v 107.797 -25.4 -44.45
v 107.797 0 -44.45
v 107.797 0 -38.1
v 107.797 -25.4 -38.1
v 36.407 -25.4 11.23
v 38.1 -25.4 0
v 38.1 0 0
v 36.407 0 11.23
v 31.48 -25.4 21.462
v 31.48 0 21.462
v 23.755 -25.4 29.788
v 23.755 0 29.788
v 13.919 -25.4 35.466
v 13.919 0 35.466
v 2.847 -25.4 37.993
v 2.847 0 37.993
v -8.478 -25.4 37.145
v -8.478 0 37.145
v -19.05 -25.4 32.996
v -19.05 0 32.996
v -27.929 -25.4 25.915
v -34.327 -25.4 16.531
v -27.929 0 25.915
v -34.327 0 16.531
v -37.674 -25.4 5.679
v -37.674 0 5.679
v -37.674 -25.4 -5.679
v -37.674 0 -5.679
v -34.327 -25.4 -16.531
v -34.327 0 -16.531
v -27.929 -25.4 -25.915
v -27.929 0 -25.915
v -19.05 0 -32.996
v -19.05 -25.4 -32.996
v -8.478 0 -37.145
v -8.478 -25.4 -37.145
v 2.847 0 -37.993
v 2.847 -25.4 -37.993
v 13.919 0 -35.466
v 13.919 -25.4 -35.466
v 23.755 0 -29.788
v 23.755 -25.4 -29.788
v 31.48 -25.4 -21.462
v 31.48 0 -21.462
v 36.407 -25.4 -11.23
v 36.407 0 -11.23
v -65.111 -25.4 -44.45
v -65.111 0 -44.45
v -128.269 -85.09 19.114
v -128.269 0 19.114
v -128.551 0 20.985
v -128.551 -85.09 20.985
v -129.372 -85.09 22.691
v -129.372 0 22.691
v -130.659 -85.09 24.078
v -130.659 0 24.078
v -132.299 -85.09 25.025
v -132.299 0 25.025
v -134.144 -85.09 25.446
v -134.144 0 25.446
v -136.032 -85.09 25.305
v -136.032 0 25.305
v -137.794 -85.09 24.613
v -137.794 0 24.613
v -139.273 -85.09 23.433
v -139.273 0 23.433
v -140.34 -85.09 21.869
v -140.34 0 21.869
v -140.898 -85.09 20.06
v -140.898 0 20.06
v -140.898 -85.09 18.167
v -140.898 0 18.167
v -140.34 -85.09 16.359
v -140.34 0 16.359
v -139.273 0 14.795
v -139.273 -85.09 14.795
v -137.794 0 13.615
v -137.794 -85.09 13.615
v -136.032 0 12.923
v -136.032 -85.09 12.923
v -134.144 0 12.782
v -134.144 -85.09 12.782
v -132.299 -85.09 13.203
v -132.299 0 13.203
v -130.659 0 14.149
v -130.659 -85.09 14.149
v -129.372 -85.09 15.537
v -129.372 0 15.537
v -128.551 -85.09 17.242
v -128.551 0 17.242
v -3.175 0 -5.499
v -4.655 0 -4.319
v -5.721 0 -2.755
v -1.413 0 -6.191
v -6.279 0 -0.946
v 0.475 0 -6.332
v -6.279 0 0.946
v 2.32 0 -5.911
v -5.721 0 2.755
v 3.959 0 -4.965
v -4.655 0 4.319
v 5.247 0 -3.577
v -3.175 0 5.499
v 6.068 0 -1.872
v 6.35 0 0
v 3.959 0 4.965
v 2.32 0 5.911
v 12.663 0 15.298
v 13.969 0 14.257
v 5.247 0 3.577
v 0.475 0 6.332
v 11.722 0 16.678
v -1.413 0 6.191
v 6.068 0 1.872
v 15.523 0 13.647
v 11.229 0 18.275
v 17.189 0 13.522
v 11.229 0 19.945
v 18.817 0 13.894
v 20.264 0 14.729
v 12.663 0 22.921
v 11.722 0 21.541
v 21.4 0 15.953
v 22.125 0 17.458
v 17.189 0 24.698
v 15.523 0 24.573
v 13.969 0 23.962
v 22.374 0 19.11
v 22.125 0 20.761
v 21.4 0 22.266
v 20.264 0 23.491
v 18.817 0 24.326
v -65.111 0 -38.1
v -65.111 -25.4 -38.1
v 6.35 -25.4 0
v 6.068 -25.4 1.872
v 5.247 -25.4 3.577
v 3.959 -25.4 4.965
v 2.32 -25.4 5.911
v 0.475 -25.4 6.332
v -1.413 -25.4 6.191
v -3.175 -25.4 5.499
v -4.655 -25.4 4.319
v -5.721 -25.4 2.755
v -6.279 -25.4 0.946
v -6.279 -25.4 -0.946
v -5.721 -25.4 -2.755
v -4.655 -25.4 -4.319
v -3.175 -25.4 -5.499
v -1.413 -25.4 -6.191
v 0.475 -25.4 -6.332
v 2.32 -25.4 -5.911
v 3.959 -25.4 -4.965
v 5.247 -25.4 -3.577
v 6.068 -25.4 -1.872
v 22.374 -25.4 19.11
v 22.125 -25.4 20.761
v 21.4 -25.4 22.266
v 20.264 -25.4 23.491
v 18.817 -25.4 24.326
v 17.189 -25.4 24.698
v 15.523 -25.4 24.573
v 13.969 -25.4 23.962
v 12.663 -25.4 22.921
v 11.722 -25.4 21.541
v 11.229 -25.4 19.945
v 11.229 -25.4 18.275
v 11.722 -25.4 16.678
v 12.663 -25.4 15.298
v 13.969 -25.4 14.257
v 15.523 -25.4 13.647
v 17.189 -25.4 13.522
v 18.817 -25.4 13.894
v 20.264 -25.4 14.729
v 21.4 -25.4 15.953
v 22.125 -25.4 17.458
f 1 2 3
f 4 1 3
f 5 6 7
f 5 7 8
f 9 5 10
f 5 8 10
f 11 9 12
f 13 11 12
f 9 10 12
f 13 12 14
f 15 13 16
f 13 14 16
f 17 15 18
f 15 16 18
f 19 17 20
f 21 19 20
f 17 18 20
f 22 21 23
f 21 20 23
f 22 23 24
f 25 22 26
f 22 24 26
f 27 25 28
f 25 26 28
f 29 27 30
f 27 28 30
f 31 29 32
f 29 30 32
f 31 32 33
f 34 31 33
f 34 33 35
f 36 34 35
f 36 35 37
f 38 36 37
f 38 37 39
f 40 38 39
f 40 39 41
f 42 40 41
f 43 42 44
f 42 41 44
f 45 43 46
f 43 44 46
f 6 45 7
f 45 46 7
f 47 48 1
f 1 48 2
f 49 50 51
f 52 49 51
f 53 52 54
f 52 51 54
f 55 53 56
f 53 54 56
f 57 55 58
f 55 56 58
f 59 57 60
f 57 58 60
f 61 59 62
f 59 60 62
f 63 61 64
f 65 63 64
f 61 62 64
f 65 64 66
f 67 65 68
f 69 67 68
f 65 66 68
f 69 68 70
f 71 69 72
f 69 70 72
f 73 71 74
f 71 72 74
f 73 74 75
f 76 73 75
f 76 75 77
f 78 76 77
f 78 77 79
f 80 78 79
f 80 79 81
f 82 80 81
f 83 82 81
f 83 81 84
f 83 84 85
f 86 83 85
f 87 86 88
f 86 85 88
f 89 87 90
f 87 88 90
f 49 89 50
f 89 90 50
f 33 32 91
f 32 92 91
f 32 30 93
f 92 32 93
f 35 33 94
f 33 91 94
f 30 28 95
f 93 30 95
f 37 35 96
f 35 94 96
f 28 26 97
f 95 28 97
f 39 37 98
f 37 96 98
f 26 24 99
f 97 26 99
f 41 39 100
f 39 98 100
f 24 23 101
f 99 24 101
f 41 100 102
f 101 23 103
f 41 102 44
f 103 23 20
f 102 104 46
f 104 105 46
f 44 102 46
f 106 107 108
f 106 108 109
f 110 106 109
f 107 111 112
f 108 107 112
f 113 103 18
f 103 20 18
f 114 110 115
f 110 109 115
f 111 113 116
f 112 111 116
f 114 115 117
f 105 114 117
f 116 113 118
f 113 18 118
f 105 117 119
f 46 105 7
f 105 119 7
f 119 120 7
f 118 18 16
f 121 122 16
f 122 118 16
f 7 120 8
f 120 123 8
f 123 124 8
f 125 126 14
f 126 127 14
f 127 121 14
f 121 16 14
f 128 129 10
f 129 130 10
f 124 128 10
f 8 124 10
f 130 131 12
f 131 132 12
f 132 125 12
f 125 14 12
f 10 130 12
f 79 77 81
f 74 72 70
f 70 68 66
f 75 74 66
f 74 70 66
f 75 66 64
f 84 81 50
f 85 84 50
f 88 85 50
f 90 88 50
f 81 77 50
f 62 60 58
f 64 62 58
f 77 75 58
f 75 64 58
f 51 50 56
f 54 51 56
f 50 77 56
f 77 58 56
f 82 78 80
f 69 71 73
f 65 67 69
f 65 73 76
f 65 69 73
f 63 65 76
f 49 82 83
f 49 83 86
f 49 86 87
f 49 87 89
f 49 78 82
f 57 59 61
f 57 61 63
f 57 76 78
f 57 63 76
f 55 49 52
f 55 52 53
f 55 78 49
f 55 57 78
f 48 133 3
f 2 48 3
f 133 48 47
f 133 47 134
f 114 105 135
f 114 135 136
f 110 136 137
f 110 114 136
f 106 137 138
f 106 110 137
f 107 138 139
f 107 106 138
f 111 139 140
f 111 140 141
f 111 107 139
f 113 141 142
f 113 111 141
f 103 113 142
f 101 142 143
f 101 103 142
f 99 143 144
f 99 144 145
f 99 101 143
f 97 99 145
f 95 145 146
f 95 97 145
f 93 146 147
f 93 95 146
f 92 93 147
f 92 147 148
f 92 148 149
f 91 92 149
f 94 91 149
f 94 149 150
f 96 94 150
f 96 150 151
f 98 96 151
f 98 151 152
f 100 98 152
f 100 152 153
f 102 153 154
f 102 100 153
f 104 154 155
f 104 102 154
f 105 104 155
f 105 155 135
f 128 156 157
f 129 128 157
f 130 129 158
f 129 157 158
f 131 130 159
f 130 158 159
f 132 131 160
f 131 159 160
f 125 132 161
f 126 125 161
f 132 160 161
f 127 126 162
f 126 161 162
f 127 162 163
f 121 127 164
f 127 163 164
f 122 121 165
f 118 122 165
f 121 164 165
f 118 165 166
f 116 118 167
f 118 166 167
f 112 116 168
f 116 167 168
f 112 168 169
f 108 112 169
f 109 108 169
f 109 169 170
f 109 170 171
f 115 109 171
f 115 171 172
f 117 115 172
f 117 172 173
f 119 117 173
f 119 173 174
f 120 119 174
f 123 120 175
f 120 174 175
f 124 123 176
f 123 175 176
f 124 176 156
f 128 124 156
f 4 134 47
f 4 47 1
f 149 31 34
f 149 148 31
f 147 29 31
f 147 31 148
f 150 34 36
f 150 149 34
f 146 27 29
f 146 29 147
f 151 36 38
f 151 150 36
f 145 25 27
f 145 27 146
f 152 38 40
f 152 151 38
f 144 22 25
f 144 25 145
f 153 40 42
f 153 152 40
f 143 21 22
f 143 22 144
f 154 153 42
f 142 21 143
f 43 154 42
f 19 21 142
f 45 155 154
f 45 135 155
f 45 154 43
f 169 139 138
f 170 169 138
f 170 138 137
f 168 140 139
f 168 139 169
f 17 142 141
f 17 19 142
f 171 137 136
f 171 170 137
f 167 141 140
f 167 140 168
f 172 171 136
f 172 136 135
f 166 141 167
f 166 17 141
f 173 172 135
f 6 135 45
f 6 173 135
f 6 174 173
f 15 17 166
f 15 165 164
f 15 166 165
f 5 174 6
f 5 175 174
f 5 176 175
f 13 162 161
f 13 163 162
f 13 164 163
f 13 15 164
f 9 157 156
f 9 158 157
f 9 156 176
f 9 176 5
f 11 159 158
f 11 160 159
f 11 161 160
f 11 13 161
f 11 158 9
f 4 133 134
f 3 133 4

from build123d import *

# Parameters (mm, degrees)
F0_R     = 38.1
F0_R_2   = 6.35
F1_DEPTH = 25.4
F2_W     = 172.908775
F2_H     = 6.35
F3_DEPTH = 25.4
F4_R     = 6.35
F5_DEPTH = 85.09
F6_R     = 5.603489
F7_DEPTH = 25.4


with BuildPart() as f1:
    # F0 (on Front) → F1 (new body)
    with BuildSketch(Plane.XZ):
        Circle(F0_R)
        Circle(F0_R_2, mode=Mode.SUBTRACT)
    extrude(amount=F1_DEPTH)

    # F6 (on face) → F7 (cut)
    with BuildSketch(Plane.XZ.offset(25.4)):
        with Locations((16.770264, 19.109719)):
            Circle(F6_R)
    extrude(amount=-F7_DEPTH, mode=Mode.SUBTRACT)


with BuildPart() as f3:
    # F2 (on Front) → F3 (new body)
    with BuildSketch(Plane.XZ):
        with Locations((21.342945, -41.275)):
            Rectangle(F2_W, F2_H)
    extrude(amount=F3_DEPTH)


with BuildPart() as f5:
    # F4 (on Front) → F5 (new body)
    with BuildSketch(Plane.XZ):
        with Locations((-134.618536, 19.113777)):
            Circle(F4_R)
    extrude(amount=F5_DEPTH)


solid = Compound([f1.part, f3.part, f5.part])
